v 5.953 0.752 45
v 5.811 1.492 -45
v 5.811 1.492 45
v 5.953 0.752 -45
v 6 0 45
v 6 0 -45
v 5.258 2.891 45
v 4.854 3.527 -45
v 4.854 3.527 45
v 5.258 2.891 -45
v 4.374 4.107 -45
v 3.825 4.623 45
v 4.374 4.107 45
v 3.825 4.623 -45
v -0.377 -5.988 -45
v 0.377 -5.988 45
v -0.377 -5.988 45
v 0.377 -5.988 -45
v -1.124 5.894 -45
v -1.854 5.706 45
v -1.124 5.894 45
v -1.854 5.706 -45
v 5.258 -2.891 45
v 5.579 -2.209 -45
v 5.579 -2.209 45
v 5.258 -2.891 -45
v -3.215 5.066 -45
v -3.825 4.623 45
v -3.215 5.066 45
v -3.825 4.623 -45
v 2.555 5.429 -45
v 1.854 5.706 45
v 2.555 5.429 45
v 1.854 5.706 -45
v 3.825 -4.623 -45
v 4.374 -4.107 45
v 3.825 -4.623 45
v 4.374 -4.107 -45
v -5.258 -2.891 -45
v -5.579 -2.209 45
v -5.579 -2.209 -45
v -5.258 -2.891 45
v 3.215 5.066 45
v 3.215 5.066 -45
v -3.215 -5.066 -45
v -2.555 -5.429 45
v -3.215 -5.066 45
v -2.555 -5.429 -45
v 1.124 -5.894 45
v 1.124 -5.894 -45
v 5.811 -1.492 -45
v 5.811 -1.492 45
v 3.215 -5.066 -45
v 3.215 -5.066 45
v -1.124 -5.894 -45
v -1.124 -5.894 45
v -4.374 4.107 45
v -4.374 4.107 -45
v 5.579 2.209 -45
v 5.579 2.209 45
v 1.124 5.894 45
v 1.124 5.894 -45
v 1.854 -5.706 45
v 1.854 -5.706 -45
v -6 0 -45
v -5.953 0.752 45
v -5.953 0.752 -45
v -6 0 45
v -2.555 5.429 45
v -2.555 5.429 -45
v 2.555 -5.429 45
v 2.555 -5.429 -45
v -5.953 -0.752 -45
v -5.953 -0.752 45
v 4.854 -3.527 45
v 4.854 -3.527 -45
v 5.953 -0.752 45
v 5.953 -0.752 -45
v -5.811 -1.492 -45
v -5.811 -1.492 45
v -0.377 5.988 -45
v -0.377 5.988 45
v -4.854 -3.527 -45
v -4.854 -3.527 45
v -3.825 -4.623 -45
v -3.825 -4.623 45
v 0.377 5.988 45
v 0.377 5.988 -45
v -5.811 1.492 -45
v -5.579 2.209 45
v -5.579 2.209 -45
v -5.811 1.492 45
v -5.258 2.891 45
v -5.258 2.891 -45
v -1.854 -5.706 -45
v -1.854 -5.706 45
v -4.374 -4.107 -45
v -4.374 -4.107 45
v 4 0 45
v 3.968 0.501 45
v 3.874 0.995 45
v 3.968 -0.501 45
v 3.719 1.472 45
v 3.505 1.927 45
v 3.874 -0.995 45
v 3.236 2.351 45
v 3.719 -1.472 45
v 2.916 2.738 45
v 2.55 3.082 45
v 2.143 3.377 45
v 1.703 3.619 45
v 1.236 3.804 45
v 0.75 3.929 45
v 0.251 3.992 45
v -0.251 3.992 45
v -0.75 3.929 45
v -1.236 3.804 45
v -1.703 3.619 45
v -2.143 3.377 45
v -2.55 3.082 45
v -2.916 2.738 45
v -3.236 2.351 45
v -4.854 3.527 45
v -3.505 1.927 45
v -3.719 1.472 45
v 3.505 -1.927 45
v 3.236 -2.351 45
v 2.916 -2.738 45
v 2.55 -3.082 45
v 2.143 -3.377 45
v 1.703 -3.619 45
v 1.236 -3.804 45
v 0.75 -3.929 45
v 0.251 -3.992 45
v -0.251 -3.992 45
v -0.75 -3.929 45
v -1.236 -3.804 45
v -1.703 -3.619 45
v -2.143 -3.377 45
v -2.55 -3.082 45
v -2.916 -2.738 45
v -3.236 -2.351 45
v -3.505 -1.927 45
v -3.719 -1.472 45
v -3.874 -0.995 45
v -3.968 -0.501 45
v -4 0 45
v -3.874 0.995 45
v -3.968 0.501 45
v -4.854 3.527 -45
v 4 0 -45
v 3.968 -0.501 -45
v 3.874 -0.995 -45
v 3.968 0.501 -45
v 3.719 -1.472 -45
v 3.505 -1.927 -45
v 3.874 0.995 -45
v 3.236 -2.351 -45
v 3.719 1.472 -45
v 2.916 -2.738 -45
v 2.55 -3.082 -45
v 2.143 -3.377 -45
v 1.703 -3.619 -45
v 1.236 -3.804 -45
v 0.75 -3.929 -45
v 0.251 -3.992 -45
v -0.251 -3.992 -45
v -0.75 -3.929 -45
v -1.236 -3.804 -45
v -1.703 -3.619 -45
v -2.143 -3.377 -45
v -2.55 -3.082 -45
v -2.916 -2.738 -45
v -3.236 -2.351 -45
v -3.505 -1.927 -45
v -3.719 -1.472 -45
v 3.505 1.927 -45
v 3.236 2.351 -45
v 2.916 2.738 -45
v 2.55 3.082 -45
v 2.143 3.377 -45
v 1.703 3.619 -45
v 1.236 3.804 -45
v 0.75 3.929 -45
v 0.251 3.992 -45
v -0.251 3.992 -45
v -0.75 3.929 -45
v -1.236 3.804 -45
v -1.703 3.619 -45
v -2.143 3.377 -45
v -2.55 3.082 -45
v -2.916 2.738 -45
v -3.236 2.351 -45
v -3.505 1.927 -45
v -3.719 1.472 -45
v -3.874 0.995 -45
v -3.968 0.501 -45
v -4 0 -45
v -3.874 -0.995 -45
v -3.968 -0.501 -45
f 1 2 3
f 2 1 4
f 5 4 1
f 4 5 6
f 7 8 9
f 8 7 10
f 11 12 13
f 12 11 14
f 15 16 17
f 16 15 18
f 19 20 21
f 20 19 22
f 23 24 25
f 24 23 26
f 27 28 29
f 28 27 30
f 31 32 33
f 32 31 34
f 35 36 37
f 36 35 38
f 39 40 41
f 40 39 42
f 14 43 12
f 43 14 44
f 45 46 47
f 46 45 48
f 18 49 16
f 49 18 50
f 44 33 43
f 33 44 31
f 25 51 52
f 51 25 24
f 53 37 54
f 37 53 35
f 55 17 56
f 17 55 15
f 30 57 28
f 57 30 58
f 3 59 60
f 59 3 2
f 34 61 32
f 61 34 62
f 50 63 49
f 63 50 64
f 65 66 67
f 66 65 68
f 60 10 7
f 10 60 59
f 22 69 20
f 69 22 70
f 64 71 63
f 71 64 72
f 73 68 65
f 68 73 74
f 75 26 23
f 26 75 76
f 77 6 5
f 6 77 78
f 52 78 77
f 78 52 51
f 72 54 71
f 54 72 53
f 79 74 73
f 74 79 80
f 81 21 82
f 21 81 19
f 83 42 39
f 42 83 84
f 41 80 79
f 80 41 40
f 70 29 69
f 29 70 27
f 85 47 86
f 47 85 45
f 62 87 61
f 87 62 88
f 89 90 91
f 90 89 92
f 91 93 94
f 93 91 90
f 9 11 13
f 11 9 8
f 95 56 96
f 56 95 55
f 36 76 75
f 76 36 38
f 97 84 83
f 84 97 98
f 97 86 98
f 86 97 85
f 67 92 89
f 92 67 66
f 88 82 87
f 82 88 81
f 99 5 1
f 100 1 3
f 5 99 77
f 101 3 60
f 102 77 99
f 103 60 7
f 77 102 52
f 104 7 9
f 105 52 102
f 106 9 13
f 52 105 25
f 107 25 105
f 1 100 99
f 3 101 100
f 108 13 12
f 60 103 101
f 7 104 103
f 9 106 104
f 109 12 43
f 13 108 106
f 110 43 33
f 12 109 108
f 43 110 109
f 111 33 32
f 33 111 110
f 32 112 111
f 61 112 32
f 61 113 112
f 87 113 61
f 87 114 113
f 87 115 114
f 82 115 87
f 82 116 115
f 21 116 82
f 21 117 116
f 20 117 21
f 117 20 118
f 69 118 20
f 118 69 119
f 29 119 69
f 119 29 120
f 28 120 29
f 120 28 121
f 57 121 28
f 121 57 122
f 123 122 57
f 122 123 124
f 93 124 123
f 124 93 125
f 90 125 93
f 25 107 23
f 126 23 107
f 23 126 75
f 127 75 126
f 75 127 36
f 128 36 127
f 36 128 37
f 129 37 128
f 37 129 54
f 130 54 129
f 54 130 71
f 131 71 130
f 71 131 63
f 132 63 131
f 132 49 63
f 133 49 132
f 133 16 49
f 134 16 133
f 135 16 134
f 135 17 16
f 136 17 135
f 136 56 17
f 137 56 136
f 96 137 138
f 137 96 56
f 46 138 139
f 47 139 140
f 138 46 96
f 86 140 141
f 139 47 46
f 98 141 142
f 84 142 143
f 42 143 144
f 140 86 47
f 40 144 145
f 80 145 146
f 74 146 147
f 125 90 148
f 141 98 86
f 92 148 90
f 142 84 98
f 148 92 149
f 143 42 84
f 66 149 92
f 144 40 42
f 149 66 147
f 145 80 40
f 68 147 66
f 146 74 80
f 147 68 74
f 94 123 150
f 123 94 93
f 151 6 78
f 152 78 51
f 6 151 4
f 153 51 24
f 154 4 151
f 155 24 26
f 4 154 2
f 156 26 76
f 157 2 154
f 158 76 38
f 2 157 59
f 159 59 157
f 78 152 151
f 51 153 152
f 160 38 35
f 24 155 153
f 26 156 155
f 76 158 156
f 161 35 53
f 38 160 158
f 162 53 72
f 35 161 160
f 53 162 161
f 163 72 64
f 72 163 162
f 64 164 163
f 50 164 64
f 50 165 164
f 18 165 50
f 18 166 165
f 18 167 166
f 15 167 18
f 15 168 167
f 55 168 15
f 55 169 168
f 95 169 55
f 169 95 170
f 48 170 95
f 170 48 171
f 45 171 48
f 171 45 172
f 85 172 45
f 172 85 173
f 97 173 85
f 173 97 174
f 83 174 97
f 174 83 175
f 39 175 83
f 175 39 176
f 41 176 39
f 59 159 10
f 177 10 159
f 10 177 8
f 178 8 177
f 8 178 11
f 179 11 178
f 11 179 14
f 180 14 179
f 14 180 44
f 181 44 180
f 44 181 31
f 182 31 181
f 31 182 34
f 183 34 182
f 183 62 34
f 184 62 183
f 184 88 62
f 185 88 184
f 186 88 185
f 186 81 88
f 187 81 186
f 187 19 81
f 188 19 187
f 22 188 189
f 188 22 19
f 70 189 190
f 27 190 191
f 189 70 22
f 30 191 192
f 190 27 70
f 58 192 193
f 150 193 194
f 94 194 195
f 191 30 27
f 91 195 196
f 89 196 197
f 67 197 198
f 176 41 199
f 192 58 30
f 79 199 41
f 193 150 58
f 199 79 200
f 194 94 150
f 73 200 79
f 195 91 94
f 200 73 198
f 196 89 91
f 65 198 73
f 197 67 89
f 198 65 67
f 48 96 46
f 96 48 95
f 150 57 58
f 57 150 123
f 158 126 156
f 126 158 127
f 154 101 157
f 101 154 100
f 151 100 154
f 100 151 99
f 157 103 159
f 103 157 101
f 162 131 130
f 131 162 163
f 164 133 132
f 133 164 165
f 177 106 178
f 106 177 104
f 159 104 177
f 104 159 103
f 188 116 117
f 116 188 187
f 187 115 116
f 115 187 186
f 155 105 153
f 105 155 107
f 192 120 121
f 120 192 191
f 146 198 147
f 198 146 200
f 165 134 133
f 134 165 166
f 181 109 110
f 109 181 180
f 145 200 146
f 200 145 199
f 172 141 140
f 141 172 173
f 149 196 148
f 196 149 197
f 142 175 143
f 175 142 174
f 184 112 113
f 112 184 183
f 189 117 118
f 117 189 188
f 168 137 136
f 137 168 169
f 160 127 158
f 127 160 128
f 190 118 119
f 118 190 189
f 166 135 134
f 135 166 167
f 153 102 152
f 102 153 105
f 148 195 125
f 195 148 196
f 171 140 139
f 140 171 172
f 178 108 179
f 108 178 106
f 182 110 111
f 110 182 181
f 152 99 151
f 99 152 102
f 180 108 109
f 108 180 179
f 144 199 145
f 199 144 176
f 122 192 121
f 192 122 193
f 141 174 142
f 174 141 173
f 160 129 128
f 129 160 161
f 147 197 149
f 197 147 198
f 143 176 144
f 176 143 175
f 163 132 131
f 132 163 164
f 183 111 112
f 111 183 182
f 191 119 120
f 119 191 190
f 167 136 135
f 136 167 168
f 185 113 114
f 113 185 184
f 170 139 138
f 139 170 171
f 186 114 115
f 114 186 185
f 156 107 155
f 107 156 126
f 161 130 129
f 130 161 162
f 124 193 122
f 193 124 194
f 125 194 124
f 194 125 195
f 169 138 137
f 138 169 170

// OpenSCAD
$fn = 50;


difference() {
	union() {
		translate(v = [0, 0, -45.0000000000]) {
			cylinder(h = 90, r = 6.0000000000);
		}
	}
	union() {
		translate(v = [0, 0, -100.0000000000]) {
			cylinder(h = 200, r = 4.0000000000);
		}
	}
}
